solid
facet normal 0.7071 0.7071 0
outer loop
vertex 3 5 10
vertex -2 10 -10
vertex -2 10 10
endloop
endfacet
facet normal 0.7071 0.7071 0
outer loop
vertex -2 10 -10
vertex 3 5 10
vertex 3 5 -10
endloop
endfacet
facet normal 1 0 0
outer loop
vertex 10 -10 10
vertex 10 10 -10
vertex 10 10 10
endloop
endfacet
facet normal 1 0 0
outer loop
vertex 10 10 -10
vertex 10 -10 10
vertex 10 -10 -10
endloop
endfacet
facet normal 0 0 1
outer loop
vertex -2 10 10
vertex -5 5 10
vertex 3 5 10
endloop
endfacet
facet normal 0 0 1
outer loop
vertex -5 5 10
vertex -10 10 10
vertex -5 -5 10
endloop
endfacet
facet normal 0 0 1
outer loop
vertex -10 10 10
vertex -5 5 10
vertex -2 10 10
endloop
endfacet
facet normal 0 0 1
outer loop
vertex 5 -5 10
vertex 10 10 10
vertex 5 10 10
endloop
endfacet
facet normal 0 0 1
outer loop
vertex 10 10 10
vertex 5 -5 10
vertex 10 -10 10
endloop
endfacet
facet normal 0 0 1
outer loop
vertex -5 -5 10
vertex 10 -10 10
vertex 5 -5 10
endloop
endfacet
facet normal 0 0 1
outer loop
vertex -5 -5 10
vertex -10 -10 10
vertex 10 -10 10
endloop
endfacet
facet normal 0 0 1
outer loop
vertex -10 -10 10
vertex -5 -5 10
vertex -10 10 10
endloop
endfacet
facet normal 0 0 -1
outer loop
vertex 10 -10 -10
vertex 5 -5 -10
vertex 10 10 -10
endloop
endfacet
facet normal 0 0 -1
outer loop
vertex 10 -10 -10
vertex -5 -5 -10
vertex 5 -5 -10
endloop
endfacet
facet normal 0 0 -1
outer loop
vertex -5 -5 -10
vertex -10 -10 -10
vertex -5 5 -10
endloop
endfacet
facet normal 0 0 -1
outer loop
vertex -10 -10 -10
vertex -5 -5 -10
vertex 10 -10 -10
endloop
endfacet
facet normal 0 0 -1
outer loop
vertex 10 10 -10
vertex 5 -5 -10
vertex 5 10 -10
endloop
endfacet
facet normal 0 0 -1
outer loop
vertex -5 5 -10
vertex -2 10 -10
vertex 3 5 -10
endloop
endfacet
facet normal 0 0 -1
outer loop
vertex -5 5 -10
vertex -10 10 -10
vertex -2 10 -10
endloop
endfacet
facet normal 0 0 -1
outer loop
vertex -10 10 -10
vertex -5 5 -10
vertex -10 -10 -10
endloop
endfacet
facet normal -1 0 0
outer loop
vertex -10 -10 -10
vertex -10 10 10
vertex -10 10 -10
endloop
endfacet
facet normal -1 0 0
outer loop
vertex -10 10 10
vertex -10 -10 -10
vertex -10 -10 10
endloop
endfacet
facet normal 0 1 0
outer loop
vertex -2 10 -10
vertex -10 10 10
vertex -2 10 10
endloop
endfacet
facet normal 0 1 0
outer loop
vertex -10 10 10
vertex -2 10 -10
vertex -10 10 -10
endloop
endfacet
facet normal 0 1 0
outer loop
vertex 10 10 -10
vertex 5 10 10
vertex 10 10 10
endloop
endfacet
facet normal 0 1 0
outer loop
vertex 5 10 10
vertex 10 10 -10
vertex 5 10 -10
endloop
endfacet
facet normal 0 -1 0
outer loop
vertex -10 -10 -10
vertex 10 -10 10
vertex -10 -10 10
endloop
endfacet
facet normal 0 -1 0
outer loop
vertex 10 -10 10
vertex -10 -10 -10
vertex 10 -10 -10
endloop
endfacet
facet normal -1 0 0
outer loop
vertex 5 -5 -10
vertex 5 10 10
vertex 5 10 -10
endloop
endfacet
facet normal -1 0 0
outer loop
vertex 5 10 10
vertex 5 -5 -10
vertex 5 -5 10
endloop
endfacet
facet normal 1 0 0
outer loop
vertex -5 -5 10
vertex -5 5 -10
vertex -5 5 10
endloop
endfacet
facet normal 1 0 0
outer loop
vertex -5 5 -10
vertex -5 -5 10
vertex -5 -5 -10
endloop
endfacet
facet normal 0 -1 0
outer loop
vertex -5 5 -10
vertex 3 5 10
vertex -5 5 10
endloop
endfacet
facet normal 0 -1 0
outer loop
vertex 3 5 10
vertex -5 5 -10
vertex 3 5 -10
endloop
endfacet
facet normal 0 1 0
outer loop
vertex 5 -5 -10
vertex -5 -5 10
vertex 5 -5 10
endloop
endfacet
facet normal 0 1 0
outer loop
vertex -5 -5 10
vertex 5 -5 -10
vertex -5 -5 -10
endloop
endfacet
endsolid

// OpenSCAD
difference(){
    cube([20,20,20],center=true);
    cube([10,10,22],center=true);
    translate([4,7,0])
    cube([2,6.1,22],center=true);
    
    translate([3,5,-11])
    rotate(a=[0,0,45])
difference(){
    cube([4,7.1,22]);
    translate([2,-0.1,-0.5])
    cube([2.1,2.1,23]);
}
}
